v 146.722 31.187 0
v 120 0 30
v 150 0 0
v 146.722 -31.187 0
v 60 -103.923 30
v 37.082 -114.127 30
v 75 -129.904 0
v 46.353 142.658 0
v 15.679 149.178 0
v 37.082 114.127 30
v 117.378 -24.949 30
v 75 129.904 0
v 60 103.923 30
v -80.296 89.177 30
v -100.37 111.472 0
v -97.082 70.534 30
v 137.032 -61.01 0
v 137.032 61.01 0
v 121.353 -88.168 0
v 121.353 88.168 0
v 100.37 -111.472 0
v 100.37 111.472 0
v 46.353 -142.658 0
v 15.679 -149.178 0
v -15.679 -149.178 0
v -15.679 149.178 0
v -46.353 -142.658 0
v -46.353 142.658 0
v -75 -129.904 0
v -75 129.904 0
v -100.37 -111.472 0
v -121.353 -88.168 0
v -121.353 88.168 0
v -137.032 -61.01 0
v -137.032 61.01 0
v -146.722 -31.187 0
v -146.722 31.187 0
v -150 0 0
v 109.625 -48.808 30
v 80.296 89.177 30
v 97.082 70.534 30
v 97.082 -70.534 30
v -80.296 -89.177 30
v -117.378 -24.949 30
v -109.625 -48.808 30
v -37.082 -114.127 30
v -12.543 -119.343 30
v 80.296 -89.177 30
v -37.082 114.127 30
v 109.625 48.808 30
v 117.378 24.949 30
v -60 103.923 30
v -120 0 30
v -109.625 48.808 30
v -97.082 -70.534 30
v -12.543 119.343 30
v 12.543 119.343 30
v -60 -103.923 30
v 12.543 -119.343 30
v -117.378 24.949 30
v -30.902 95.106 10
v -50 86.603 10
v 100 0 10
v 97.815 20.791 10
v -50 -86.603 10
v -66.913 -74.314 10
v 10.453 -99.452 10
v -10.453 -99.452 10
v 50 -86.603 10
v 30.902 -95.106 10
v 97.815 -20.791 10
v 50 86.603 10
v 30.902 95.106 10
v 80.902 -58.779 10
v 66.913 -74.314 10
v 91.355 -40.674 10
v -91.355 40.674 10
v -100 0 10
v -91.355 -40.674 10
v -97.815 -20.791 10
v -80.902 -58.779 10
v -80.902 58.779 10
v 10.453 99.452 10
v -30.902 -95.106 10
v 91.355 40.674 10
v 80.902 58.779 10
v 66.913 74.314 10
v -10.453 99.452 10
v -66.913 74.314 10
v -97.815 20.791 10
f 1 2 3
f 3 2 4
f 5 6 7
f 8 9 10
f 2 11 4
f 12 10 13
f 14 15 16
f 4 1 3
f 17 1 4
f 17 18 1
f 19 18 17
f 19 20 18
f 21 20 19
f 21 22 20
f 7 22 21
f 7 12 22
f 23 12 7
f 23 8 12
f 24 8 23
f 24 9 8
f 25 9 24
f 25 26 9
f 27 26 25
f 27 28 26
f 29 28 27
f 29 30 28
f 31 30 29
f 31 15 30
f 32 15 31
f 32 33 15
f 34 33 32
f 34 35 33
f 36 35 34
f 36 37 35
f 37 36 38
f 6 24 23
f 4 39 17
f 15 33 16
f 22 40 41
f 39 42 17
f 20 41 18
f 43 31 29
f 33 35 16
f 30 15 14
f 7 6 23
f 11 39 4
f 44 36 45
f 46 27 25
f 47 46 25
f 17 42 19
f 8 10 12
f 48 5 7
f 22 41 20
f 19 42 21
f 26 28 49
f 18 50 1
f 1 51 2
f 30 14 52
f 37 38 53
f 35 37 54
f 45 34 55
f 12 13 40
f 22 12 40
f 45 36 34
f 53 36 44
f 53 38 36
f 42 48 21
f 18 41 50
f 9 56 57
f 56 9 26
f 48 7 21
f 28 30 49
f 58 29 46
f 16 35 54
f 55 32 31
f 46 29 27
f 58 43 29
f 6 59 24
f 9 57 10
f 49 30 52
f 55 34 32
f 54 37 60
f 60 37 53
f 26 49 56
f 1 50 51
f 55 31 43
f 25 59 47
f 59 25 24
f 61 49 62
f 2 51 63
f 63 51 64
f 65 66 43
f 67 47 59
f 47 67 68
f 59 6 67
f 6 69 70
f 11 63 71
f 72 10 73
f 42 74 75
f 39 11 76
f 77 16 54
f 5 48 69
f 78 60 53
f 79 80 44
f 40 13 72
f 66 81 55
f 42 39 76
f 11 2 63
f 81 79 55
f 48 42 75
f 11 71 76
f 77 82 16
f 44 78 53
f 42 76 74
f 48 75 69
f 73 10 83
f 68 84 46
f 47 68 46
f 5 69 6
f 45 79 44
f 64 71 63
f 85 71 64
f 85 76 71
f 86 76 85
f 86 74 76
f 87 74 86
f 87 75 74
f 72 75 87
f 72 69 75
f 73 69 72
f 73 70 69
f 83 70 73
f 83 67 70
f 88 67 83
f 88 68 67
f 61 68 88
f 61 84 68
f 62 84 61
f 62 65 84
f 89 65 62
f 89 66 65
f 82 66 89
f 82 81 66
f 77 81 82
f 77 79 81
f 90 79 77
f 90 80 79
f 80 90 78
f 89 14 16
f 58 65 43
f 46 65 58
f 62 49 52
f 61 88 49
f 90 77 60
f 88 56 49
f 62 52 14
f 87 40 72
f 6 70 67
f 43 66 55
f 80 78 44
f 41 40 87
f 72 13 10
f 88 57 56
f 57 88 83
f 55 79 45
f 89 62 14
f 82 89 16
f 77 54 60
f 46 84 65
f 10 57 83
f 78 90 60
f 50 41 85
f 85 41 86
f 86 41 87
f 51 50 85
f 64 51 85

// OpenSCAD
difference(){
cylinder(h = 30, r1 = 150, r2 = 120);
translate(v = [0,0,+10])
cylinder(h = 20, r1 = 100, r2 =120 );
}
